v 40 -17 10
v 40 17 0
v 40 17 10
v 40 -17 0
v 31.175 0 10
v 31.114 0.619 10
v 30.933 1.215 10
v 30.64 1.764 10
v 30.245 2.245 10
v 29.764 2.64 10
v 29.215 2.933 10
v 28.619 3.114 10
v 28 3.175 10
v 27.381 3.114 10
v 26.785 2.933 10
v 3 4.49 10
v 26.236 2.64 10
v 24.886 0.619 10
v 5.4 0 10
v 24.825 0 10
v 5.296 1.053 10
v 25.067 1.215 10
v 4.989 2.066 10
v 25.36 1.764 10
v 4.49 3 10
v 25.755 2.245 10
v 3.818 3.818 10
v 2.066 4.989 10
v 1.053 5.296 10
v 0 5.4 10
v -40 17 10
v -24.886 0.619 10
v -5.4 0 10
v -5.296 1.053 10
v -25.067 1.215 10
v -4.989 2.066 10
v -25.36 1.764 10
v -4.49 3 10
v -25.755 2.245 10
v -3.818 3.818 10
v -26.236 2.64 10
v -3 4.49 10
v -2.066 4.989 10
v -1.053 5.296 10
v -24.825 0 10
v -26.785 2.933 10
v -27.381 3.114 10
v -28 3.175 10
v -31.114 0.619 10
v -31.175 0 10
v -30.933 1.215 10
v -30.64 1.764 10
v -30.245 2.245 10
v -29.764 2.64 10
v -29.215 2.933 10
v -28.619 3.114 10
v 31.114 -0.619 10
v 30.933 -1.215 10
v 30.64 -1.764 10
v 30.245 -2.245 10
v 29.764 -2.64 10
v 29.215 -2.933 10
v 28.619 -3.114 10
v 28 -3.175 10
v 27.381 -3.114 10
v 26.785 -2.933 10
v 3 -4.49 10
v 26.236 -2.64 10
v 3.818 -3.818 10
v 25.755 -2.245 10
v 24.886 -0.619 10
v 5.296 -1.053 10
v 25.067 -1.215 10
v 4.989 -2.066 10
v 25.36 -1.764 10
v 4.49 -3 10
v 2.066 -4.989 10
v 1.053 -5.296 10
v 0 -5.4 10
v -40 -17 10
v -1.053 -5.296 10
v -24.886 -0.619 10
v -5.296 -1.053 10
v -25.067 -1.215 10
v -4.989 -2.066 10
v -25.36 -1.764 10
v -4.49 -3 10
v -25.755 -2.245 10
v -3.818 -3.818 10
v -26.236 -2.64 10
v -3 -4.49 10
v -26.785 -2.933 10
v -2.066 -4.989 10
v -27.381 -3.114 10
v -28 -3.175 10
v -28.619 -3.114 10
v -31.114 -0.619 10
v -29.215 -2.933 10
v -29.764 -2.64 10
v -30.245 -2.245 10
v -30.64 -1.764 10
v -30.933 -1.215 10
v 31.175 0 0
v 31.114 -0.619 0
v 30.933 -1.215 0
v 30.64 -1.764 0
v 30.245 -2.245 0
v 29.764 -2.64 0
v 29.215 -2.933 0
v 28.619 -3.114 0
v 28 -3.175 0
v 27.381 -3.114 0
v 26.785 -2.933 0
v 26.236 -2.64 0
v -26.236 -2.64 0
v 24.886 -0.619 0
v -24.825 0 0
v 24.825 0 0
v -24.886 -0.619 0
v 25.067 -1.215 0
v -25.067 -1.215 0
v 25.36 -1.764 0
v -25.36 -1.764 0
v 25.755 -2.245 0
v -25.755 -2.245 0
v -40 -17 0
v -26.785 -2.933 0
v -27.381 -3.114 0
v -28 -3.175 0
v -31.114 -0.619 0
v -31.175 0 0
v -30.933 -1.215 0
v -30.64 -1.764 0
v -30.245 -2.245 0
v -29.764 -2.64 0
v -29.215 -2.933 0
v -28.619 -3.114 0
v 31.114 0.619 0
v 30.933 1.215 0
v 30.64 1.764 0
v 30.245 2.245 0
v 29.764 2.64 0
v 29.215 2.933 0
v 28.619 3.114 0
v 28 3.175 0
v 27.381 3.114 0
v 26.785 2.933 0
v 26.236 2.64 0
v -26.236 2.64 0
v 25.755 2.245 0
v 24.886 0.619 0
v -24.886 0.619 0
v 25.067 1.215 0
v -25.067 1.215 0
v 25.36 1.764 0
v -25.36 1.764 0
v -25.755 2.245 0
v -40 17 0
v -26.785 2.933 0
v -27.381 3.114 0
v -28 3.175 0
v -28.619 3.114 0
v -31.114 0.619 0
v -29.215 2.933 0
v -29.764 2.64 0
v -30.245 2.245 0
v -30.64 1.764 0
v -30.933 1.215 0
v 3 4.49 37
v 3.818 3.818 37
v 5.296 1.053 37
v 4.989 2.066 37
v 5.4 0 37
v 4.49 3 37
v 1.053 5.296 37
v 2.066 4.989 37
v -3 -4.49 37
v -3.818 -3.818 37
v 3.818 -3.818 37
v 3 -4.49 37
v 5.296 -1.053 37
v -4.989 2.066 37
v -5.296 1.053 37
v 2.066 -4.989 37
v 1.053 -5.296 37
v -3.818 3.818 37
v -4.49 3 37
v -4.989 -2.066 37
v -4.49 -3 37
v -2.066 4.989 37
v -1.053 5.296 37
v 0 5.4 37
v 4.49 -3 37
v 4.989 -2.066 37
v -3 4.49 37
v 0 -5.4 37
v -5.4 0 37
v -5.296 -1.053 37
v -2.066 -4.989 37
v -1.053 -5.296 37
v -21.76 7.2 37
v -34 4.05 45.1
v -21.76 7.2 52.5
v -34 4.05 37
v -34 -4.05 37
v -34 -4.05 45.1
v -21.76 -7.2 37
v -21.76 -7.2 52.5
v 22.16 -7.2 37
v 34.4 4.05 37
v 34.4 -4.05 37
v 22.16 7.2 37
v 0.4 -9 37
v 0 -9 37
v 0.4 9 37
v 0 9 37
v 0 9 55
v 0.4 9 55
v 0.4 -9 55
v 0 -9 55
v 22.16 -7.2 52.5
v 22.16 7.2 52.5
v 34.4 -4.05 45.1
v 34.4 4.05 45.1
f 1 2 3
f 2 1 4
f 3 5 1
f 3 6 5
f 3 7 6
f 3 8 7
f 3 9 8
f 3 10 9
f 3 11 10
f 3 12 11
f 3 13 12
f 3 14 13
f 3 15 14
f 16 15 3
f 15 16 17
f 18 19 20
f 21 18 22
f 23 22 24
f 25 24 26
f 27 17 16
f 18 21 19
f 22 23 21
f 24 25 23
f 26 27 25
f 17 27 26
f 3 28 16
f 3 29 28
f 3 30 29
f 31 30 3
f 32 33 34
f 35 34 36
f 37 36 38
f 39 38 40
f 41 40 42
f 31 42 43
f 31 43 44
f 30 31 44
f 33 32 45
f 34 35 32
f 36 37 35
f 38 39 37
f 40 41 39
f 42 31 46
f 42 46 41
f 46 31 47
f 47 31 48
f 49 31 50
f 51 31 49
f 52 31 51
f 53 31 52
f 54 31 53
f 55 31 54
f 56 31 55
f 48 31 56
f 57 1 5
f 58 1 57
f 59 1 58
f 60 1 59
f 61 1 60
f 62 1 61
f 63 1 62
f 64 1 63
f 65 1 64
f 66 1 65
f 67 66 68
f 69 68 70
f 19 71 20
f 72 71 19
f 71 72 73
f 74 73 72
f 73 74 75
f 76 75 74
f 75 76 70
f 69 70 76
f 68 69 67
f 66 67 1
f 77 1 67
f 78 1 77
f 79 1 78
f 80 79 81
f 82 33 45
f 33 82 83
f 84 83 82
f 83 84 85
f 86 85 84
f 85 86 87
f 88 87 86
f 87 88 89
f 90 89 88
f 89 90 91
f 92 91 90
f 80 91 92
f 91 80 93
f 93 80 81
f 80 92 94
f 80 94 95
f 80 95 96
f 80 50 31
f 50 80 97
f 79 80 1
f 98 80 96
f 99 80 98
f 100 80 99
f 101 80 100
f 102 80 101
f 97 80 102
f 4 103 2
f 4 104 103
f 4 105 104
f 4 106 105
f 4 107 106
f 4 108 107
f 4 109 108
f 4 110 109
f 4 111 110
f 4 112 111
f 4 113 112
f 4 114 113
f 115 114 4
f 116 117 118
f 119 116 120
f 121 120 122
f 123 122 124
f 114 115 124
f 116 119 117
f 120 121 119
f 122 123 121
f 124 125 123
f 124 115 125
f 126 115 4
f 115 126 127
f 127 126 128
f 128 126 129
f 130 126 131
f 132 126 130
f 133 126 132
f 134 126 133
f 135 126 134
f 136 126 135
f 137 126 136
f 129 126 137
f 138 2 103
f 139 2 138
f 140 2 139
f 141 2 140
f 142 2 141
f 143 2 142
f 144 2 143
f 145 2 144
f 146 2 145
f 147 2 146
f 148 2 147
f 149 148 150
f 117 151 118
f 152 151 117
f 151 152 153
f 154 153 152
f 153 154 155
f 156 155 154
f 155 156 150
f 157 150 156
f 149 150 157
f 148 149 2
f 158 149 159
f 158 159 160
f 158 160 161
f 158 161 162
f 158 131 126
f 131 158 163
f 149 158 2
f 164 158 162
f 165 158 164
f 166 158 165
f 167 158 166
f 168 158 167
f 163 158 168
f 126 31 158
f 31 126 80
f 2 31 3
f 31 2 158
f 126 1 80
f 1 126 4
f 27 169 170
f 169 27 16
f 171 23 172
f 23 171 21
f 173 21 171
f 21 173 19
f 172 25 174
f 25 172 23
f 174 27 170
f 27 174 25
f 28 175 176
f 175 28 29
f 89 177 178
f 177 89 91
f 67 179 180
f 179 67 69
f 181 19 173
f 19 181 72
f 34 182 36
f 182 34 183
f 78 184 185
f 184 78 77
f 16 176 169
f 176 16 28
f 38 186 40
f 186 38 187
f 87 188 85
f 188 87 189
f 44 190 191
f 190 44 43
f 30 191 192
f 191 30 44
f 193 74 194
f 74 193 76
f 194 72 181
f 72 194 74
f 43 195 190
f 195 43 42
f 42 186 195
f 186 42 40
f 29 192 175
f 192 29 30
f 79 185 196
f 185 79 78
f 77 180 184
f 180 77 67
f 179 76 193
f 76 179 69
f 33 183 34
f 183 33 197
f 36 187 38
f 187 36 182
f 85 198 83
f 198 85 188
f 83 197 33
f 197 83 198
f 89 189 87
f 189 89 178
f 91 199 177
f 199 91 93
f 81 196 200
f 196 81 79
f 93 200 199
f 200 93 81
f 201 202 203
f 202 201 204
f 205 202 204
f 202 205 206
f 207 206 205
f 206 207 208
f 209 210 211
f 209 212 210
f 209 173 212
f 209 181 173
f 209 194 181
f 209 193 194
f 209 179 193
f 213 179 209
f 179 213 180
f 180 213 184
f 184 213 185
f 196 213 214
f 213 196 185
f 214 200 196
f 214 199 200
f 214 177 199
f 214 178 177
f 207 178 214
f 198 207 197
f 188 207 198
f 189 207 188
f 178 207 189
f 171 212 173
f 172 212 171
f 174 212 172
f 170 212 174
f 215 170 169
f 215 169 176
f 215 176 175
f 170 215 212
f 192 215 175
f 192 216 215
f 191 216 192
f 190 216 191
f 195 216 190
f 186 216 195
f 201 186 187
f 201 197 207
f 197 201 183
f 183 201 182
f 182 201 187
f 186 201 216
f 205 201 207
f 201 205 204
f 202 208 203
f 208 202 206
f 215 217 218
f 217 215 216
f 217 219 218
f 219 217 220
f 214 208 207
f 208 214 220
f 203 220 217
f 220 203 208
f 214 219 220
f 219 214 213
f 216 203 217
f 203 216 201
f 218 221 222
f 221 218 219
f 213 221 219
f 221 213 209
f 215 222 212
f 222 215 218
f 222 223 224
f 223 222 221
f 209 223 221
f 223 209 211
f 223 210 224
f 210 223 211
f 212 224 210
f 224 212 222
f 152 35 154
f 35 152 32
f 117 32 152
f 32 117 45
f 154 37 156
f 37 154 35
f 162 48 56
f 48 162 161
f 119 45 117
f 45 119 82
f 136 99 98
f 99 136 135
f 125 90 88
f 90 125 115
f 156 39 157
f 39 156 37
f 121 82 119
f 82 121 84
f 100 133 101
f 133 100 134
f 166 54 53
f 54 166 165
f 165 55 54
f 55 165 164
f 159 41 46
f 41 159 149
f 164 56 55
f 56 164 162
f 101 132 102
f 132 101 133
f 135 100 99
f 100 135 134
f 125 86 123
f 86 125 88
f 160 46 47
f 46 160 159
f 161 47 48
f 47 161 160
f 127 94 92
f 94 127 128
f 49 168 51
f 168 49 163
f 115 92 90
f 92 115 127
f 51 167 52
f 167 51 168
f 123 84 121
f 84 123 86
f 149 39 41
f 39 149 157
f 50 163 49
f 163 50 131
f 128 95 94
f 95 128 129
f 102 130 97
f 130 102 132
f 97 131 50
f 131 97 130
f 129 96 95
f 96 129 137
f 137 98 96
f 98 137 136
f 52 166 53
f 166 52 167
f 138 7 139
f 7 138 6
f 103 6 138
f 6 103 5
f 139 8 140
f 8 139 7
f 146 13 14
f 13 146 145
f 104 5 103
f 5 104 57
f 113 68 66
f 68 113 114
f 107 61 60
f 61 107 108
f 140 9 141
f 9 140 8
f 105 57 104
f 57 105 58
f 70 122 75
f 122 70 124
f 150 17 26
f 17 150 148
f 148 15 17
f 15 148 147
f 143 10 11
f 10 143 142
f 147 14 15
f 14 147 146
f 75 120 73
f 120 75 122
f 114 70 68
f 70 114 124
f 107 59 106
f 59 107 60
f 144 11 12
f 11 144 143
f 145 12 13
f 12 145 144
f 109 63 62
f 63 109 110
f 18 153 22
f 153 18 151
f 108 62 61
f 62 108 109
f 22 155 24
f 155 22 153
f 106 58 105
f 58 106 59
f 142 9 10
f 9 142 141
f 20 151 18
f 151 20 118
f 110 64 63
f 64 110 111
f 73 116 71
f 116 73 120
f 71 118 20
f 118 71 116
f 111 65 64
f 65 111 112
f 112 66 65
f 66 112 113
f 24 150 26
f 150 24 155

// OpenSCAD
$fn = 32;

// ----------------------------------------------------------------------
// Boat cleat: 80 mm base, horn 46 mm up
// ----------------------------------------------------------------------

// --- parameters (mm) ---
base_l = 80;              // base length
base_w = 34;              // base width
base_t = 10;              // base thickness
horn_len = 68;            // horn length
horn_d = 18;              // horn diameter at the middle
horn_z = 46;              // horn axis height
end_drop = 10;            // how far the horn tips drop
post_d = 10.8;            // centre post diameter
holes_d = 6.35;           // fixing holes
hole_x = 28;              // fixing hole spacing

difference() {
  union() {
    translate([-40, -17, 0]) cube([base_l, base_w, base_t]);
    /* centre post, sunk 1 mm into the base */
    translate([0, 0, 9]) cylinder(h = 37, d = post_d);
    /* horn: a hull chain of boxes, full in the middle and lighter at the tips */
    hull() {
      translate([-34, -4.05, 37]) cube([0.4, 8.1, 8.1], center = false);
      translate([-21.76, -7.2, 37]) cube([0.4, 14.4, 15.5], center = false);
    }
    hull() {
      translate([-21.76, -7.2, 37]) cube([0.4, 14.4, 15.5], center = false);
      translate([0, -9, 37]) cube([0.4, 18, 18], center = false);
    }
    hull() {
      translate([0, -9, 37]) cube([0.4, 18, 18], center = false);
      translate([21.76, -7.2, 37]) cube([0.4, 14.4, 15.5], center = false);
    }
    hull() {
      translate([21.76, -7.2, 37]) cube([0.4, 14.4, 15.5], center = false);
      translate([34, -4.05, 37]) cube([0.4, 8.1, 8.1], center = false);
    }
  }
  translate([-28, 0, -2.5]) cylinder(h = base_t + 5, d = holes_d);
  translate([28, 0, -2.5]) cylinder(h = base_t + 5, d = holes_d);
}
